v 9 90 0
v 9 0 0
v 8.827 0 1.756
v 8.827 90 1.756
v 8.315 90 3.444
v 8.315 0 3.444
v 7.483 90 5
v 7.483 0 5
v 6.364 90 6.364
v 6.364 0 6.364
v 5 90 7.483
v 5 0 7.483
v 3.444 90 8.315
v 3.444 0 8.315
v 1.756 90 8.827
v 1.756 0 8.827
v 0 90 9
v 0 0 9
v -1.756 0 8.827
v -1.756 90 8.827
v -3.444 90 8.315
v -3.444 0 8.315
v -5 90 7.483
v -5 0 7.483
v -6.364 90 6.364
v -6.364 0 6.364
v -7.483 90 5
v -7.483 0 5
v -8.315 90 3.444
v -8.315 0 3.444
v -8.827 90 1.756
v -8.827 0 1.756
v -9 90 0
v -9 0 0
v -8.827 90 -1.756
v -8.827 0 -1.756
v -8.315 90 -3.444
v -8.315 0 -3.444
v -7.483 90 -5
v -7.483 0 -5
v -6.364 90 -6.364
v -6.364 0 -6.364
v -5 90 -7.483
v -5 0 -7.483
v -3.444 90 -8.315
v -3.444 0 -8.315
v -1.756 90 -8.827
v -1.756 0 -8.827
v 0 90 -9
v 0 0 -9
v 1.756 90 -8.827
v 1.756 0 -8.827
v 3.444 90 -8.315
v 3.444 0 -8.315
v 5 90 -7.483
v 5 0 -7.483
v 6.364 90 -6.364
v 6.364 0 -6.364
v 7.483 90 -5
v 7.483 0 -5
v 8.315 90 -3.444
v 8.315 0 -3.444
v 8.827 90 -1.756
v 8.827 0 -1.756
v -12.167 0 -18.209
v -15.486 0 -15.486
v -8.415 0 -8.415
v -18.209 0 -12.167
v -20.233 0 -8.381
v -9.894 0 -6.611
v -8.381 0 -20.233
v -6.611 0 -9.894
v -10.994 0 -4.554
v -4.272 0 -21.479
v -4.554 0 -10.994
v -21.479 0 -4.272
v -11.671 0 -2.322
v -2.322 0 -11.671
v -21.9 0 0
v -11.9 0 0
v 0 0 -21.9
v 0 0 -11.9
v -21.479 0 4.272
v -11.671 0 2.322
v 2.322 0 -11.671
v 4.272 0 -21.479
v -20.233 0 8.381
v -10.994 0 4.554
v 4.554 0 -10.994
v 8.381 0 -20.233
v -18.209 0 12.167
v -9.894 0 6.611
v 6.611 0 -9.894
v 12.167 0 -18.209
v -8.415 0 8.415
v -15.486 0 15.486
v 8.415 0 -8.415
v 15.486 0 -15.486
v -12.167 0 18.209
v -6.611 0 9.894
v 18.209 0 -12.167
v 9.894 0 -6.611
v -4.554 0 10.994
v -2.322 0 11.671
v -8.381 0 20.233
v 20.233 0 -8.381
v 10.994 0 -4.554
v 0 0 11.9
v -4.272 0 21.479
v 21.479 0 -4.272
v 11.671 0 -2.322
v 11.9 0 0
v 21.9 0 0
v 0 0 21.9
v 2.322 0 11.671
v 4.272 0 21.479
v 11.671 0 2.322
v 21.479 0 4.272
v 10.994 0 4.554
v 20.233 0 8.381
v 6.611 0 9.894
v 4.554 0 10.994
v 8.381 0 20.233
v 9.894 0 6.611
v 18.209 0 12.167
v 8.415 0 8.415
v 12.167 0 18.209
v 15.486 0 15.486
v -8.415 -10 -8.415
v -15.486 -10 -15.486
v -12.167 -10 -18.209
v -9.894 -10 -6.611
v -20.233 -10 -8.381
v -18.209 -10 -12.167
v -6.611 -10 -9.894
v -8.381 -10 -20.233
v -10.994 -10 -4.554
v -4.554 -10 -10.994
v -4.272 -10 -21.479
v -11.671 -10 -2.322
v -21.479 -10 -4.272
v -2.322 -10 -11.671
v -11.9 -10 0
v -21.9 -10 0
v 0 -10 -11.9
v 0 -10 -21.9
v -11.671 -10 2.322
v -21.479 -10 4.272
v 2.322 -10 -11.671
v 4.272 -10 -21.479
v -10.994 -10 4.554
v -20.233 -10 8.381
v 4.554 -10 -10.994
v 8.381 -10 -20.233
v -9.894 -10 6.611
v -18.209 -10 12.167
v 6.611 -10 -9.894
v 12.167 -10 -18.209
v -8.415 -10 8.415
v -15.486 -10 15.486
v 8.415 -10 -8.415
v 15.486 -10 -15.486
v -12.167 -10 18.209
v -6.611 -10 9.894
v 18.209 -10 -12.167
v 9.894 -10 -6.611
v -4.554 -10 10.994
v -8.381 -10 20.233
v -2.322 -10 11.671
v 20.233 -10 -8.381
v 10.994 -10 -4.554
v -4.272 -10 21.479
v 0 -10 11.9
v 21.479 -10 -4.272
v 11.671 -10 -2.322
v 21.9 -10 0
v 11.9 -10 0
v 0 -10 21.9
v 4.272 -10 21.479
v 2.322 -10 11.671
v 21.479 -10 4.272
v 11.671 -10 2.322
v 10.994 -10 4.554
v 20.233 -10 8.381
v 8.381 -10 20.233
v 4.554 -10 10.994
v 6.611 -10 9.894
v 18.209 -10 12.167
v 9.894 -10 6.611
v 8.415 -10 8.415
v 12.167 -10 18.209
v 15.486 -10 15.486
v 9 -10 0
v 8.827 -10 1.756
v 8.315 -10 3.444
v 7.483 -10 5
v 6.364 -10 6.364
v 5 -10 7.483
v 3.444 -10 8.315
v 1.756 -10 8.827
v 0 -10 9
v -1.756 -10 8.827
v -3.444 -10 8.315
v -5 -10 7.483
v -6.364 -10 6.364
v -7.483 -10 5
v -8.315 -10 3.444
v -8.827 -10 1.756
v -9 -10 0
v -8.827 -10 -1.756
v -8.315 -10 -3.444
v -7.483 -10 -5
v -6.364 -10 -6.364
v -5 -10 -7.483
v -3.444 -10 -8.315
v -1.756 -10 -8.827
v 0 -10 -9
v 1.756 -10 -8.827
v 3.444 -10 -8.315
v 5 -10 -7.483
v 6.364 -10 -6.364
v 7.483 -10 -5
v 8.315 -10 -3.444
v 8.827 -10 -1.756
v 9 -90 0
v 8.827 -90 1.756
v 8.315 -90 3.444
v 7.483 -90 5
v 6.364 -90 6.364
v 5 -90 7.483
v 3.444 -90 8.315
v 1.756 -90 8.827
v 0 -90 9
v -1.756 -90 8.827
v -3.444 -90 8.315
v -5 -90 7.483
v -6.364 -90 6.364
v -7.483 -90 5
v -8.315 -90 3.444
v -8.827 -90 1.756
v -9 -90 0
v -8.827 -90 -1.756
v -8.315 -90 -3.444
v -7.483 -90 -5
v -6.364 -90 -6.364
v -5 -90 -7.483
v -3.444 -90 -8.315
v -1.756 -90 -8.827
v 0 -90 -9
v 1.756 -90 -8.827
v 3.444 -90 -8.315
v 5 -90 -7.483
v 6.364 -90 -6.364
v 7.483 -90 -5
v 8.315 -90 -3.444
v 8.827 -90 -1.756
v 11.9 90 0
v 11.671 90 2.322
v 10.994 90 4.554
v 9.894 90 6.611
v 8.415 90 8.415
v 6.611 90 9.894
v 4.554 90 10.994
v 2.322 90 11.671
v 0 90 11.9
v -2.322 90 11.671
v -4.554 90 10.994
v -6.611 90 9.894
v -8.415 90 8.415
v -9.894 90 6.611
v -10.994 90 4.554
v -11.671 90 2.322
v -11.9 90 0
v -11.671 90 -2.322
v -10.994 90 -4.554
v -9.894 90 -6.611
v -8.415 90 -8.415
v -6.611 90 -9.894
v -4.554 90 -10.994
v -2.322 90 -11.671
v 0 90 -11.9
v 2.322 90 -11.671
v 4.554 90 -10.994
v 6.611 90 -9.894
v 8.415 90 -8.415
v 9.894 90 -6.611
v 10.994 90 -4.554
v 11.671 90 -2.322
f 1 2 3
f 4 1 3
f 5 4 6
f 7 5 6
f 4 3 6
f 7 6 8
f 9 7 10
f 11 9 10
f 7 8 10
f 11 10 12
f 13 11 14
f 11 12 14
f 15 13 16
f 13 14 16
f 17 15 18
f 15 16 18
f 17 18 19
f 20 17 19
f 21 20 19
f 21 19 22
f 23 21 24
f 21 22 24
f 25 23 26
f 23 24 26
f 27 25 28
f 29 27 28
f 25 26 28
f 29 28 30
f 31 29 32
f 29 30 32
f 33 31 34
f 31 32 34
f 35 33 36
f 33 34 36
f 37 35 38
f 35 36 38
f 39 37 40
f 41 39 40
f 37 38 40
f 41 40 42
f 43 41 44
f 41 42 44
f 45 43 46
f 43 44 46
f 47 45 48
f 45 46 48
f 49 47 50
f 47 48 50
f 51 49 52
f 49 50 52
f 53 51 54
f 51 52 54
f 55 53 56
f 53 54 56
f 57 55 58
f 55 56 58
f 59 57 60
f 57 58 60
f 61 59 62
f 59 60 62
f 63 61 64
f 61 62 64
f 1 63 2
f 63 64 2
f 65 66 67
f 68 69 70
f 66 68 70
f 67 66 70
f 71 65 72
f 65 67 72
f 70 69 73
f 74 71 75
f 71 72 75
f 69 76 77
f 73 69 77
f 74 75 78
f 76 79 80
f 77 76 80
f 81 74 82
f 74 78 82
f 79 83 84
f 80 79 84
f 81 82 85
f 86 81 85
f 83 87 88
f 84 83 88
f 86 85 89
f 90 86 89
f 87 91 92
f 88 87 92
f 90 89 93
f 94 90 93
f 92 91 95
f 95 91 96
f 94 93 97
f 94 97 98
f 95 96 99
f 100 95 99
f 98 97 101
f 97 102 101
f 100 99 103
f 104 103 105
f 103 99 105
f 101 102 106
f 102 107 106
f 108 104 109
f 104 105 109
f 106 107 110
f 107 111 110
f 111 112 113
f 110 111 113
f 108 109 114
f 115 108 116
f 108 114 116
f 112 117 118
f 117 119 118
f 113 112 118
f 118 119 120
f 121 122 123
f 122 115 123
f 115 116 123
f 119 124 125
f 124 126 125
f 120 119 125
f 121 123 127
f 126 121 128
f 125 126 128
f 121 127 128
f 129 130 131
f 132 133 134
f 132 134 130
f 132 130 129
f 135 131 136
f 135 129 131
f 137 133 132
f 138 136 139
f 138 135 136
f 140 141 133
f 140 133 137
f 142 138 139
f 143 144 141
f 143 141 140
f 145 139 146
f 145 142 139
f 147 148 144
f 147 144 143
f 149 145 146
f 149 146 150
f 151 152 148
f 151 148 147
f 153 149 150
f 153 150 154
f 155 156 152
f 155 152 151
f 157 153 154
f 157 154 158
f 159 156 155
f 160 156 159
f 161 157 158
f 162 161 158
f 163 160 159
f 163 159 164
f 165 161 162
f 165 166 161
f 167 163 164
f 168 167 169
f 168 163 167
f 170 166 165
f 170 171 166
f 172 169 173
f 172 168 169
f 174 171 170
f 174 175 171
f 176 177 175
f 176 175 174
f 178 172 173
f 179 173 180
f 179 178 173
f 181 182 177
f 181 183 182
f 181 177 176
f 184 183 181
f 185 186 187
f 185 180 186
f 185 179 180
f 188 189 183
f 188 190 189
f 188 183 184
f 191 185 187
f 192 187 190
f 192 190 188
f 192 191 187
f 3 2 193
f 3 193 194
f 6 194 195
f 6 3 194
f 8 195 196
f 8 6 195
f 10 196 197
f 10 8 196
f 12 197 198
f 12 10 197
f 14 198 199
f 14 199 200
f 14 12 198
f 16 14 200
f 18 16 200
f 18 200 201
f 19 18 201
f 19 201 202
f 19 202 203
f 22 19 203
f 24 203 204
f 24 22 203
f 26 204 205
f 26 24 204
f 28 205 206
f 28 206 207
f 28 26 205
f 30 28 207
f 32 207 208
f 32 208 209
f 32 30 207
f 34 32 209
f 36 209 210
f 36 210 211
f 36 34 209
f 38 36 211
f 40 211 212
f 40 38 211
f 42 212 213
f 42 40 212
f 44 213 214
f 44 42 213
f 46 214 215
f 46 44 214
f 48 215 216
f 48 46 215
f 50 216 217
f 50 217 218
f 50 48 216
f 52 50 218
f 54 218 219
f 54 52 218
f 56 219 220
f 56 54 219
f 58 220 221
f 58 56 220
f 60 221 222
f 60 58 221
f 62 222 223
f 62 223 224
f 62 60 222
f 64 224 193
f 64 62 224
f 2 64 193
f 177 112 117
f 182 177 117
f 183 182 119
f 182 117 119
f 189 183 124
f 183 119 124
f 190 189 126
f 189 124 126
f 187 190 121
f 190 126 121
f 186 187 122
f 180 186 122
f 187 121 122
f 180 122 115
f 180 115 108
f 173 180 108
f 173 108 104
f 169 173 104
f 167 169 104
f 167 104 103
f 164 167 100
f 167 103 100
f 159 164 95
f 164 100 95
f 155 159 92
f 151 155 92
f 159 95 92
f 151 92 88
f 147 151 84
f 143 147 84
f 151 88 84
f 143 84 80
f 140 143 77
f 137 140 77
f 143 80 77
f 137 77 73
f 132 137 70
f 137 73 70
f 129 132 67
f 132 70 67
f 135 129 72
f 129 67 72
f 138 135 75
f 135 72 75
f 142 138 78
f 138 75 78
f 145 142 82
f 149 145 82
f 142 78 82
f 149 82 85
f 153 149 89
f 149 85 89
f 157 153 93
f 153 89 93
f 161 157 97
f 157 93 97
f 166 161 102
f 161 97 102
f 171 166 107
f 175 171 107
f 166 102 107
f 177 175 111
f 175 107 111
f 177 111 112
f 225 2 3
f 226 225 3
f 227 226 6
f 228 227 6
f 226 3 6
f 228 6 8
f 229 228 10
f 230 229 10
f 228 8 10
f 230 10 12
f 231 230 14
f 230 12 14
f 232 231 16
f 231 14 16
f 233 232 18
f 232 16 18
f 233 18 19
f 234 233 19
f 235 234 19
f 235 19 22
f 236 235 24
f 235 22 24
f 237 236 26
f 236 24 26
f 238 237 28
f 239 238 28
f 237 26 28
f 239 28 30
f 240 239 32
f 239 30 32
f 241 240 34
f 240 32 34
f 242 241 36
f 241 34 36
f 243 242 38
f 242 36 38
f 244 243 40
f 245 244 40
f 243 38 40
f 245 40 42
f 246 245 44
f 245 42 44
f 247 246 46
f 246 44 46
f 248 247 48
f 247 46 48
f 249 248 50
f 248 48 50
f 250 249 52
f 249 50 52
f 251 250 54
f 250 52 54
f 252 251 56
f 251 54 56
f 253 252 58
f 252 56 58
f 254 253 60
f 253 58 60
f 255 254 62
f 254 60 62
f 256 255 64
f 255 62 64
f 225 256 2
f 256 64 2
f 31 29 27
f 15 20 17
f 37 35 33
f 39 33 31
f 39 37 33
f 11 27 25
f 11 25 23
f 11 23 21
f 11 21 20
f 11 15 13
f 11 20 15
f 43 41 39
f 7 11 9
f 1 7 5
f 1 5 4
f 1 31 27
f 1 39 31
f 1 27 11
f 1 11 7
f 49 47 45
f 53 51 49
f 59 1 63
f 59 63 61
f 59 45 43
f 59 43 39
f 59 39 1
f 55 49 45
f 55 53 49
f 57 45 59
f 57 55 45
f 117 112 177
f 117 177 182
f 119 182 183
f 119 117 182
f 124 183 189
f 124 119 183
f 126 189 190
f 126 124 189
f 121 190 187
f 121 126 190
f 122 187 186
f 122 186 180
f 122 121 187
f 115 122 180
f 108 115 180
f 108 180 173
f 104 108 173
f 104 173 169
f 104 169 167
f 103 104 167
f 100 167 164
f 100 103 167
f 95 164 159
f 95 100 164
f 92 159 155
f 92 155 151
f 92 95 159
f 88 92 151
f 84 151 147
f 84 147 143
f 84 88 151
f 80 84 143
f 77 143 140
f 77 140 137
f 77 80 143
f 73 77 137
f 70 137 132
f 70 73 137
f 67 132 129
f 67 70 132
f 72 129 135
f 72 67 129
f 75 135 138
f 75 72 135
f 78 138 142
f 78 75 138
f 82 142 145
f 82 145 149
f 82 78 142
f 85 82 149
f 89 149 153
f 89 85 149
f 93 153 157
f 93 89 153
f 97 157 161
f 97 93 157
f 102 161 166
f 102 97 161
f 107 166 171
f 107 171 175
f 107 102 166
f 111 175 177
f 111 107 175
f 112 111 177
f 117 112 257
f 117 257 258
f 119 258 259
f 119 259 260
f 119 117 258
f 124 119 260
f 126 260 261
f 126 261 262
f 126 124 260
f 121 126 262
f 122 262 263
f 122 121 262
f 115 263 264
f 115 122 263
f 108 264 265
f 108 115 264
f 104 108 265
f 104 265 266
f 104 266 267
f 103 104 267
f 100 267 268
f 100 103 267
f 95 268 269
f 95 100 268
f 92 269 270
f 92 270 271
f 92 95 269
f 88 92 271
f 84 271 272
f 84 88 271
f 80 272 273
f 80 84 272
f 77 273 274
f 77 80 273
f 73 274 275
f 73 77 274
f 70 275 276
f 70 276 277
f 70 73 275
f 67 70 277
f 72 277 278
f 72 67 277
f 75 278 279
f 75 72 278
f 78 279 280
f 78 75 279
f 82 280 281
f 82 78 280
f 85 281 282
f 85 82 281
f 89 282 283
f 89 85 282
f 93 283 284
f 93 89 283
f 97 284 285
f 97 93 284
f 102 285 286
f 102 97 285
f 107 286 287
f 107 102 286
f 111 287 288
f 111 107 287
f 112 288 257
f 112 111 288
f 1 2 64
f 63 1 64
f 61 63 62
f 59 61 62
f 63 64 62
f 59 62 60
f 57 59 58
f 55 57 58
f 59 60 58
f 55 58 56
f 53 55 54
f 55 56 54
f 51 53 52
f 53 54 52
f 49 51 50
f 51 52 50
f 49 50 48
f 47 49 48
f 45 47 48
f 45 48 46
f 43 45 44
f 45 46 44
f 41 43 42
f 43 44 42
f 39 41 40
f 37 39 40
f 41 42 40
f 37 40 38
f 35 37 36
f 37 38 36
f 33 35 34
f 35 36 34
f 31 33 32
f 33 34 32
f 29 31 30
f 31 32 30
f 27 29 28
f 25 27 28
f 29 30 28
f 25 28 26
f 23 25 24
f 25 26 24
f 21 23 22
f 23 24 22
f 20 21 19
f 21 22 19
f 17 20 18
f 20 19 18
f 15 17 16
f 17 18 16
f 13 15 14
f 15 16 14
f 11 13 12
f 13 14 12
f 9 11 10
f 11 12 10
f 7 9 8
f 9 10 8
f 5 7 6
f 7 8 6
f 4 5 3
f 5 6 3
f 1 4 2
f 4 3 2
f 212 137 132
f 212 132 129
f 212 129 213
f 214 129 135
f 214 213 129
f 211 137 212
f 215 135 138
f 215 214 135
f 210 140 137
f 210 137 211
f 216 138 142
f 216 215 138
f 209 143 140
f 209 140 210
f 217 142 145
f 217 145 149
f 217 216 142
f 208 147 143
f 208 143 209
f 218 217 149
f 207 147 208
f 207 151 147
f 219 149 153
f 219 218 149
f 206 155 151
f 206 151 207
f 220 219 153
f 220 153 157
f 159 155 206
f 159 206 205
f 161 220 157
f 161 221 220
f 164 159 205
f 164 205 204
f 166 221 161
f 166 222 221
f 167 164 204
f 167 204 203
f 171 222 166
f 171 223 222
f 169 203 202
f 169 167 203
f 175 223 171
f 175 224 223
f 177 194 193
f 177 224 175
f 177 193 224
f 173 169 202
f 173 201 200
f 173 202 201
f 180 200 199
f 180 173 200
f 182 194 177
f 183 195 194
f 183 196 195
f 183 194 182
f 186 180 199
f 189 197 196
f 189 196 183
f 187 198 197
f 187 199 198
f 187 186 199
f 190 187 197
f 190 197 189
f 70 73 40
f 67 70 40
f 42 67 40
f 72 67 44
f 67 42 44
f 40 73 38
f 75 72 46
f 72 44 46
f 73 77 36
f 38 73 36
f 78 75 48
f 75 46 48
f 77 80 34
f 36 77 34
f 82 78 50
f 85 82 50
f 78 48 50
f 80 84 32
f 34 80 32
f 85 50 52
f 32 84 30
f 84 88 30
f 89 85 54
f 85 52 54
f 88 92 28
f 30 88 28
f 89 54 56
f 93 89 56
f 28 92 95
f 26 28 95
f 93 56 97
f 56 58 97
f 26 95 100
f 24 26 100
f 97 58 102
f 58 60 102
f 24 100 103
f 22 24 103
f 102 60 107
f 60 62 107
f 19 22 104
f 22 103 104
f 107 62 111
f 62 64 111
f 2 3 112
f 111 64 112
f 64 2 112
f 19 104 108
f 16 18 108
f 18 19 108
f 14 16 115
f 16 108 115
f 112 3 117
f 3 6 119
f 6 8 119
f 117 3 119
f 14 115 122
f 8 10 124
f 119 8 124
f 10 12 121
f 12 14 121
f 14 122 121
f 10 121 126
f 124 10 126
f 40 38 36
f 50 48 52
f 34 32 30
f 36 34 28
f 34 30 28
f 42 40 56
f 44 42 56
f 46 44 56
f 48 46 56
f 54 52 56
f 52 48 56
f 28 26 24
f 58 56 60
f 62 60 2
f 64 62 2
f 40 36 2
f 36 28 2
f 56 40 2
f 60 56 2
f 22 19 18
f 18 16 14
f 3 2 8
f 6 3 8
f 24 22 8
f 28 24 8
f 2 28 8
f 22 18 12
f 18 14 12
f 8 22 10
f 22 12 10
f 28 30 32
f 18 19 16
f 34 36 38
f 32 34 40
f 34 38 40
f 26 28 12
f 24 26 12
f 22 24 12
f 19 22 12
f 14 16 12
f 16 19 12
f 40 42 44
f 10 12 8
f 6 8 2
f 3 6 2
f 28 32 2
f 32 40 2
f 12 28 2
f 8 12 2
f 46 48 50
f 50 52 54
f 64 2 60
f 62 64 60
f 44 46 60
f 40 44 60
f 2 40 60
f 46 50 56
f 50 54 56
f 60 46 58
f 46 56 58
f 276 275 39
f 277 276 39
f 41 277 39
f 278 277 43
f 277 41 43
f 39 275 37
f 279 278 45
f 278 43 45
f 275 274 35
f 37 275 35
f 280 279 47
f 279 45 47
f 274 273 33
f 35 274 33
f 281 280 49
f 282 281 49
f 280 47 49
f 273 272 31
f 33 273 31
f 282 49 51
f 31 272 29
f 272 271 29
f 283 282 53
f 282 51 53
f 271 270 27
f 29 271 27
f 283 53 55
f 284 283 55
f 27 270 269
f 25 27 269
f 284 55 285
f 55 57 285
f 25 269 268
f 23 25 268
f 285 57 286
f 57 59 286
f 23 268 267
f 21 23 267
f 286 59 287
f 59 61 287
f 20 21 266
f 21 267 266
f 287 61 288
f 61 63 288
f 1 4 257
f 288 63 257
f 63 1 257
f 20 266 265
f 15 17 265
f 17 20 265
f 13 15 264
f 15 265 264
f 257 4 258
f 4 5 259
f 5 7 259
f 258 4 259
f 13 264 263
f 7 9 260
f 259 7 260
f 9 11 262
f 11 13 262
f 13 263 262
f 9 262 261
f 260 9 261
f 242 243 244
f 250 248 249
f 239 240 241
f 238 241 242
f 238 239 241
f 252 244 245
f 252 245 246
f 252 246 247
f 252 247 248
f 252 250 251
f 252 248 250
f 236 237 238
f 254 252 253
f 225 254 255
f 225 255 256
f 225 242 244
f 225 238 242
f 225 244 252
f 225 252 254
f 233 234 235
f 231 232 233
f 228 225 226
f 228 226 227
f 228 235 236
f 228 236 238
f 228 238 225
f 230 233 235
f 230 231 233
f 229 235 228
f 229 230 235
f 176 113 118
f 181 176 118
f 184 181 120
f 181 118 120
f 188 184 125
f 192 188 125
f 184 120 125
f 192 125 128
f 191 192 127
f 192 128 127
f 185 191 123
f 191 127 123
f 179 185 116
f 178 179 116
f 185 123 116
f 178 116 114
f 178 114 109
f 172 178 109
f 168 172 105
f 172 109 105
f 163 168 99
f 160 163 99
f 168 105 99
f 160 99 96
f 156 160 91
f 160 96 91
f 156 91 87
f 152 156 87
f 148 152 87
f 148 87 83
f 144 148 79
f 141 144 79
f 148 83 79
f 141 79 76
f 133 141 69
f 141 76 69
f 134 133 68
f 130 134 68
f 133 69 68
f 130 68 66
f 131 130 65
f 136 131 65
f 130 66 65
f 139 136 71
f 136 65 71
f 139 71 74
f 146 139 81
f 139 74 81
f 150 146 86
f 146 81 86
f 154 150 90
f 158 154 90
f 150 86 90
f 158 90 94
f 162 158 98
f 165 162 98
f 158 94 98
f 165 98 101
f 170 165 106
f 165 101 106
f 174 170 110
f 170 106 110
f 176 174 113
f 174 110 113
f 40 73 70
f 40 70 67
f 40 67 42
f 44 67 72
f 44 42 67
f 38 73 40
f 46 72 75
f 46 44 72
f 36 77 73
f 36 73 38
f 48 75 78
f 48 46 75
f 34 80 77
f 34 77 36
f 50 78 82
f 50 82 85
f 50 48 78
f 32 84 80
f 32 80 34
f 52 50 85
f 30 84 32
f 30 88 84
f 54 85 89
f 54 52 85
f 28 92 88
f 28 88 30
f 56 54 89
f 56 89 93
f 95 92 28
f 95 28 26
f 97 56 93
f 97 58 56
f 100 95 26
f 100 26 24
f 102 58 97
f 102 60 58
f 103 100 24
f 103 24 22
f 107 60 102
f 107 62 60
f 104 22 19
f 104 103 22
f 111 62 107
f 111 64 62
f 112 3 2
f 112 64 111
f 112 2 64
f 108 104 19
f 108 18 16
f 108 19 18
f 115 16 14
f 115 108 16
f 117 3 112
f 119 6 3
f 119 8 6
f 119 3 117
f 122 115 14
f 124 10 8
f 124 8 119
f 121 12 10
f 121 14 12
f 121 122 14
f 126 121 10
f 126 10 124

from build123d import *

# Parameters (mm, degrees)
F0_R      = 9
F1_DEPTH  = 90
F0_R_2    = 21.9
F0_R_3    = 11.9
F2_DEPTH  = 10
F3_DEPTH  = 90
F4_DEPTH  = 10
F1_FACE_R = 9
F5_DEPTH  = 90


with BuildPart() as f1:
    # F0 (on Front) → F1 (new body)
    with BuildSketch(Plane.XZ):
        Circle(F0_R)
    extrude(amount=F1_DEPTH)


with BuildPart() as f2:
    # F0 (on Front) → F2 (new body)
    with BuildSketch(Plane.XZ):
        Circle(F0_R_2)
        Circle(F0_R_3, mode=Mode.SUBTRACT)
    extrude(amount=F2_DEPTH)


with BuildPart() as f3:
    # F0 (on Front) → F3 (new body)
    with BuildSketch(Plane.XZ):
        Circle(F0_R_3)
        Circle(F0_R, mode=Mode.SUBTRACT)
    extrude(amount=-F3_DEPTH)


with BuildPart() as f4:
    # F0 (on Front) → F4 (new body)
    with BuildSketch(Plane.XZ):
        Circle(F0_R_3)
        Circle(F0_R, mode=Mode.SUBTRACT)
    extrude(amount=F4_DEPTH)


with BuildPart() as f5:
    # F1_face (on face) → F5 (new body)
    with BuildSketch(Plane(origin=(0, 0, 0), x_dir=(1, 0, 0), z_dir=(0, 1, 0))):
        Circle(F1_FACE_R)
    extrude(amount=F5_DEPTH)


solid = Compound([f1.part, f2.part, f3.part, f4.part, f5.part])
